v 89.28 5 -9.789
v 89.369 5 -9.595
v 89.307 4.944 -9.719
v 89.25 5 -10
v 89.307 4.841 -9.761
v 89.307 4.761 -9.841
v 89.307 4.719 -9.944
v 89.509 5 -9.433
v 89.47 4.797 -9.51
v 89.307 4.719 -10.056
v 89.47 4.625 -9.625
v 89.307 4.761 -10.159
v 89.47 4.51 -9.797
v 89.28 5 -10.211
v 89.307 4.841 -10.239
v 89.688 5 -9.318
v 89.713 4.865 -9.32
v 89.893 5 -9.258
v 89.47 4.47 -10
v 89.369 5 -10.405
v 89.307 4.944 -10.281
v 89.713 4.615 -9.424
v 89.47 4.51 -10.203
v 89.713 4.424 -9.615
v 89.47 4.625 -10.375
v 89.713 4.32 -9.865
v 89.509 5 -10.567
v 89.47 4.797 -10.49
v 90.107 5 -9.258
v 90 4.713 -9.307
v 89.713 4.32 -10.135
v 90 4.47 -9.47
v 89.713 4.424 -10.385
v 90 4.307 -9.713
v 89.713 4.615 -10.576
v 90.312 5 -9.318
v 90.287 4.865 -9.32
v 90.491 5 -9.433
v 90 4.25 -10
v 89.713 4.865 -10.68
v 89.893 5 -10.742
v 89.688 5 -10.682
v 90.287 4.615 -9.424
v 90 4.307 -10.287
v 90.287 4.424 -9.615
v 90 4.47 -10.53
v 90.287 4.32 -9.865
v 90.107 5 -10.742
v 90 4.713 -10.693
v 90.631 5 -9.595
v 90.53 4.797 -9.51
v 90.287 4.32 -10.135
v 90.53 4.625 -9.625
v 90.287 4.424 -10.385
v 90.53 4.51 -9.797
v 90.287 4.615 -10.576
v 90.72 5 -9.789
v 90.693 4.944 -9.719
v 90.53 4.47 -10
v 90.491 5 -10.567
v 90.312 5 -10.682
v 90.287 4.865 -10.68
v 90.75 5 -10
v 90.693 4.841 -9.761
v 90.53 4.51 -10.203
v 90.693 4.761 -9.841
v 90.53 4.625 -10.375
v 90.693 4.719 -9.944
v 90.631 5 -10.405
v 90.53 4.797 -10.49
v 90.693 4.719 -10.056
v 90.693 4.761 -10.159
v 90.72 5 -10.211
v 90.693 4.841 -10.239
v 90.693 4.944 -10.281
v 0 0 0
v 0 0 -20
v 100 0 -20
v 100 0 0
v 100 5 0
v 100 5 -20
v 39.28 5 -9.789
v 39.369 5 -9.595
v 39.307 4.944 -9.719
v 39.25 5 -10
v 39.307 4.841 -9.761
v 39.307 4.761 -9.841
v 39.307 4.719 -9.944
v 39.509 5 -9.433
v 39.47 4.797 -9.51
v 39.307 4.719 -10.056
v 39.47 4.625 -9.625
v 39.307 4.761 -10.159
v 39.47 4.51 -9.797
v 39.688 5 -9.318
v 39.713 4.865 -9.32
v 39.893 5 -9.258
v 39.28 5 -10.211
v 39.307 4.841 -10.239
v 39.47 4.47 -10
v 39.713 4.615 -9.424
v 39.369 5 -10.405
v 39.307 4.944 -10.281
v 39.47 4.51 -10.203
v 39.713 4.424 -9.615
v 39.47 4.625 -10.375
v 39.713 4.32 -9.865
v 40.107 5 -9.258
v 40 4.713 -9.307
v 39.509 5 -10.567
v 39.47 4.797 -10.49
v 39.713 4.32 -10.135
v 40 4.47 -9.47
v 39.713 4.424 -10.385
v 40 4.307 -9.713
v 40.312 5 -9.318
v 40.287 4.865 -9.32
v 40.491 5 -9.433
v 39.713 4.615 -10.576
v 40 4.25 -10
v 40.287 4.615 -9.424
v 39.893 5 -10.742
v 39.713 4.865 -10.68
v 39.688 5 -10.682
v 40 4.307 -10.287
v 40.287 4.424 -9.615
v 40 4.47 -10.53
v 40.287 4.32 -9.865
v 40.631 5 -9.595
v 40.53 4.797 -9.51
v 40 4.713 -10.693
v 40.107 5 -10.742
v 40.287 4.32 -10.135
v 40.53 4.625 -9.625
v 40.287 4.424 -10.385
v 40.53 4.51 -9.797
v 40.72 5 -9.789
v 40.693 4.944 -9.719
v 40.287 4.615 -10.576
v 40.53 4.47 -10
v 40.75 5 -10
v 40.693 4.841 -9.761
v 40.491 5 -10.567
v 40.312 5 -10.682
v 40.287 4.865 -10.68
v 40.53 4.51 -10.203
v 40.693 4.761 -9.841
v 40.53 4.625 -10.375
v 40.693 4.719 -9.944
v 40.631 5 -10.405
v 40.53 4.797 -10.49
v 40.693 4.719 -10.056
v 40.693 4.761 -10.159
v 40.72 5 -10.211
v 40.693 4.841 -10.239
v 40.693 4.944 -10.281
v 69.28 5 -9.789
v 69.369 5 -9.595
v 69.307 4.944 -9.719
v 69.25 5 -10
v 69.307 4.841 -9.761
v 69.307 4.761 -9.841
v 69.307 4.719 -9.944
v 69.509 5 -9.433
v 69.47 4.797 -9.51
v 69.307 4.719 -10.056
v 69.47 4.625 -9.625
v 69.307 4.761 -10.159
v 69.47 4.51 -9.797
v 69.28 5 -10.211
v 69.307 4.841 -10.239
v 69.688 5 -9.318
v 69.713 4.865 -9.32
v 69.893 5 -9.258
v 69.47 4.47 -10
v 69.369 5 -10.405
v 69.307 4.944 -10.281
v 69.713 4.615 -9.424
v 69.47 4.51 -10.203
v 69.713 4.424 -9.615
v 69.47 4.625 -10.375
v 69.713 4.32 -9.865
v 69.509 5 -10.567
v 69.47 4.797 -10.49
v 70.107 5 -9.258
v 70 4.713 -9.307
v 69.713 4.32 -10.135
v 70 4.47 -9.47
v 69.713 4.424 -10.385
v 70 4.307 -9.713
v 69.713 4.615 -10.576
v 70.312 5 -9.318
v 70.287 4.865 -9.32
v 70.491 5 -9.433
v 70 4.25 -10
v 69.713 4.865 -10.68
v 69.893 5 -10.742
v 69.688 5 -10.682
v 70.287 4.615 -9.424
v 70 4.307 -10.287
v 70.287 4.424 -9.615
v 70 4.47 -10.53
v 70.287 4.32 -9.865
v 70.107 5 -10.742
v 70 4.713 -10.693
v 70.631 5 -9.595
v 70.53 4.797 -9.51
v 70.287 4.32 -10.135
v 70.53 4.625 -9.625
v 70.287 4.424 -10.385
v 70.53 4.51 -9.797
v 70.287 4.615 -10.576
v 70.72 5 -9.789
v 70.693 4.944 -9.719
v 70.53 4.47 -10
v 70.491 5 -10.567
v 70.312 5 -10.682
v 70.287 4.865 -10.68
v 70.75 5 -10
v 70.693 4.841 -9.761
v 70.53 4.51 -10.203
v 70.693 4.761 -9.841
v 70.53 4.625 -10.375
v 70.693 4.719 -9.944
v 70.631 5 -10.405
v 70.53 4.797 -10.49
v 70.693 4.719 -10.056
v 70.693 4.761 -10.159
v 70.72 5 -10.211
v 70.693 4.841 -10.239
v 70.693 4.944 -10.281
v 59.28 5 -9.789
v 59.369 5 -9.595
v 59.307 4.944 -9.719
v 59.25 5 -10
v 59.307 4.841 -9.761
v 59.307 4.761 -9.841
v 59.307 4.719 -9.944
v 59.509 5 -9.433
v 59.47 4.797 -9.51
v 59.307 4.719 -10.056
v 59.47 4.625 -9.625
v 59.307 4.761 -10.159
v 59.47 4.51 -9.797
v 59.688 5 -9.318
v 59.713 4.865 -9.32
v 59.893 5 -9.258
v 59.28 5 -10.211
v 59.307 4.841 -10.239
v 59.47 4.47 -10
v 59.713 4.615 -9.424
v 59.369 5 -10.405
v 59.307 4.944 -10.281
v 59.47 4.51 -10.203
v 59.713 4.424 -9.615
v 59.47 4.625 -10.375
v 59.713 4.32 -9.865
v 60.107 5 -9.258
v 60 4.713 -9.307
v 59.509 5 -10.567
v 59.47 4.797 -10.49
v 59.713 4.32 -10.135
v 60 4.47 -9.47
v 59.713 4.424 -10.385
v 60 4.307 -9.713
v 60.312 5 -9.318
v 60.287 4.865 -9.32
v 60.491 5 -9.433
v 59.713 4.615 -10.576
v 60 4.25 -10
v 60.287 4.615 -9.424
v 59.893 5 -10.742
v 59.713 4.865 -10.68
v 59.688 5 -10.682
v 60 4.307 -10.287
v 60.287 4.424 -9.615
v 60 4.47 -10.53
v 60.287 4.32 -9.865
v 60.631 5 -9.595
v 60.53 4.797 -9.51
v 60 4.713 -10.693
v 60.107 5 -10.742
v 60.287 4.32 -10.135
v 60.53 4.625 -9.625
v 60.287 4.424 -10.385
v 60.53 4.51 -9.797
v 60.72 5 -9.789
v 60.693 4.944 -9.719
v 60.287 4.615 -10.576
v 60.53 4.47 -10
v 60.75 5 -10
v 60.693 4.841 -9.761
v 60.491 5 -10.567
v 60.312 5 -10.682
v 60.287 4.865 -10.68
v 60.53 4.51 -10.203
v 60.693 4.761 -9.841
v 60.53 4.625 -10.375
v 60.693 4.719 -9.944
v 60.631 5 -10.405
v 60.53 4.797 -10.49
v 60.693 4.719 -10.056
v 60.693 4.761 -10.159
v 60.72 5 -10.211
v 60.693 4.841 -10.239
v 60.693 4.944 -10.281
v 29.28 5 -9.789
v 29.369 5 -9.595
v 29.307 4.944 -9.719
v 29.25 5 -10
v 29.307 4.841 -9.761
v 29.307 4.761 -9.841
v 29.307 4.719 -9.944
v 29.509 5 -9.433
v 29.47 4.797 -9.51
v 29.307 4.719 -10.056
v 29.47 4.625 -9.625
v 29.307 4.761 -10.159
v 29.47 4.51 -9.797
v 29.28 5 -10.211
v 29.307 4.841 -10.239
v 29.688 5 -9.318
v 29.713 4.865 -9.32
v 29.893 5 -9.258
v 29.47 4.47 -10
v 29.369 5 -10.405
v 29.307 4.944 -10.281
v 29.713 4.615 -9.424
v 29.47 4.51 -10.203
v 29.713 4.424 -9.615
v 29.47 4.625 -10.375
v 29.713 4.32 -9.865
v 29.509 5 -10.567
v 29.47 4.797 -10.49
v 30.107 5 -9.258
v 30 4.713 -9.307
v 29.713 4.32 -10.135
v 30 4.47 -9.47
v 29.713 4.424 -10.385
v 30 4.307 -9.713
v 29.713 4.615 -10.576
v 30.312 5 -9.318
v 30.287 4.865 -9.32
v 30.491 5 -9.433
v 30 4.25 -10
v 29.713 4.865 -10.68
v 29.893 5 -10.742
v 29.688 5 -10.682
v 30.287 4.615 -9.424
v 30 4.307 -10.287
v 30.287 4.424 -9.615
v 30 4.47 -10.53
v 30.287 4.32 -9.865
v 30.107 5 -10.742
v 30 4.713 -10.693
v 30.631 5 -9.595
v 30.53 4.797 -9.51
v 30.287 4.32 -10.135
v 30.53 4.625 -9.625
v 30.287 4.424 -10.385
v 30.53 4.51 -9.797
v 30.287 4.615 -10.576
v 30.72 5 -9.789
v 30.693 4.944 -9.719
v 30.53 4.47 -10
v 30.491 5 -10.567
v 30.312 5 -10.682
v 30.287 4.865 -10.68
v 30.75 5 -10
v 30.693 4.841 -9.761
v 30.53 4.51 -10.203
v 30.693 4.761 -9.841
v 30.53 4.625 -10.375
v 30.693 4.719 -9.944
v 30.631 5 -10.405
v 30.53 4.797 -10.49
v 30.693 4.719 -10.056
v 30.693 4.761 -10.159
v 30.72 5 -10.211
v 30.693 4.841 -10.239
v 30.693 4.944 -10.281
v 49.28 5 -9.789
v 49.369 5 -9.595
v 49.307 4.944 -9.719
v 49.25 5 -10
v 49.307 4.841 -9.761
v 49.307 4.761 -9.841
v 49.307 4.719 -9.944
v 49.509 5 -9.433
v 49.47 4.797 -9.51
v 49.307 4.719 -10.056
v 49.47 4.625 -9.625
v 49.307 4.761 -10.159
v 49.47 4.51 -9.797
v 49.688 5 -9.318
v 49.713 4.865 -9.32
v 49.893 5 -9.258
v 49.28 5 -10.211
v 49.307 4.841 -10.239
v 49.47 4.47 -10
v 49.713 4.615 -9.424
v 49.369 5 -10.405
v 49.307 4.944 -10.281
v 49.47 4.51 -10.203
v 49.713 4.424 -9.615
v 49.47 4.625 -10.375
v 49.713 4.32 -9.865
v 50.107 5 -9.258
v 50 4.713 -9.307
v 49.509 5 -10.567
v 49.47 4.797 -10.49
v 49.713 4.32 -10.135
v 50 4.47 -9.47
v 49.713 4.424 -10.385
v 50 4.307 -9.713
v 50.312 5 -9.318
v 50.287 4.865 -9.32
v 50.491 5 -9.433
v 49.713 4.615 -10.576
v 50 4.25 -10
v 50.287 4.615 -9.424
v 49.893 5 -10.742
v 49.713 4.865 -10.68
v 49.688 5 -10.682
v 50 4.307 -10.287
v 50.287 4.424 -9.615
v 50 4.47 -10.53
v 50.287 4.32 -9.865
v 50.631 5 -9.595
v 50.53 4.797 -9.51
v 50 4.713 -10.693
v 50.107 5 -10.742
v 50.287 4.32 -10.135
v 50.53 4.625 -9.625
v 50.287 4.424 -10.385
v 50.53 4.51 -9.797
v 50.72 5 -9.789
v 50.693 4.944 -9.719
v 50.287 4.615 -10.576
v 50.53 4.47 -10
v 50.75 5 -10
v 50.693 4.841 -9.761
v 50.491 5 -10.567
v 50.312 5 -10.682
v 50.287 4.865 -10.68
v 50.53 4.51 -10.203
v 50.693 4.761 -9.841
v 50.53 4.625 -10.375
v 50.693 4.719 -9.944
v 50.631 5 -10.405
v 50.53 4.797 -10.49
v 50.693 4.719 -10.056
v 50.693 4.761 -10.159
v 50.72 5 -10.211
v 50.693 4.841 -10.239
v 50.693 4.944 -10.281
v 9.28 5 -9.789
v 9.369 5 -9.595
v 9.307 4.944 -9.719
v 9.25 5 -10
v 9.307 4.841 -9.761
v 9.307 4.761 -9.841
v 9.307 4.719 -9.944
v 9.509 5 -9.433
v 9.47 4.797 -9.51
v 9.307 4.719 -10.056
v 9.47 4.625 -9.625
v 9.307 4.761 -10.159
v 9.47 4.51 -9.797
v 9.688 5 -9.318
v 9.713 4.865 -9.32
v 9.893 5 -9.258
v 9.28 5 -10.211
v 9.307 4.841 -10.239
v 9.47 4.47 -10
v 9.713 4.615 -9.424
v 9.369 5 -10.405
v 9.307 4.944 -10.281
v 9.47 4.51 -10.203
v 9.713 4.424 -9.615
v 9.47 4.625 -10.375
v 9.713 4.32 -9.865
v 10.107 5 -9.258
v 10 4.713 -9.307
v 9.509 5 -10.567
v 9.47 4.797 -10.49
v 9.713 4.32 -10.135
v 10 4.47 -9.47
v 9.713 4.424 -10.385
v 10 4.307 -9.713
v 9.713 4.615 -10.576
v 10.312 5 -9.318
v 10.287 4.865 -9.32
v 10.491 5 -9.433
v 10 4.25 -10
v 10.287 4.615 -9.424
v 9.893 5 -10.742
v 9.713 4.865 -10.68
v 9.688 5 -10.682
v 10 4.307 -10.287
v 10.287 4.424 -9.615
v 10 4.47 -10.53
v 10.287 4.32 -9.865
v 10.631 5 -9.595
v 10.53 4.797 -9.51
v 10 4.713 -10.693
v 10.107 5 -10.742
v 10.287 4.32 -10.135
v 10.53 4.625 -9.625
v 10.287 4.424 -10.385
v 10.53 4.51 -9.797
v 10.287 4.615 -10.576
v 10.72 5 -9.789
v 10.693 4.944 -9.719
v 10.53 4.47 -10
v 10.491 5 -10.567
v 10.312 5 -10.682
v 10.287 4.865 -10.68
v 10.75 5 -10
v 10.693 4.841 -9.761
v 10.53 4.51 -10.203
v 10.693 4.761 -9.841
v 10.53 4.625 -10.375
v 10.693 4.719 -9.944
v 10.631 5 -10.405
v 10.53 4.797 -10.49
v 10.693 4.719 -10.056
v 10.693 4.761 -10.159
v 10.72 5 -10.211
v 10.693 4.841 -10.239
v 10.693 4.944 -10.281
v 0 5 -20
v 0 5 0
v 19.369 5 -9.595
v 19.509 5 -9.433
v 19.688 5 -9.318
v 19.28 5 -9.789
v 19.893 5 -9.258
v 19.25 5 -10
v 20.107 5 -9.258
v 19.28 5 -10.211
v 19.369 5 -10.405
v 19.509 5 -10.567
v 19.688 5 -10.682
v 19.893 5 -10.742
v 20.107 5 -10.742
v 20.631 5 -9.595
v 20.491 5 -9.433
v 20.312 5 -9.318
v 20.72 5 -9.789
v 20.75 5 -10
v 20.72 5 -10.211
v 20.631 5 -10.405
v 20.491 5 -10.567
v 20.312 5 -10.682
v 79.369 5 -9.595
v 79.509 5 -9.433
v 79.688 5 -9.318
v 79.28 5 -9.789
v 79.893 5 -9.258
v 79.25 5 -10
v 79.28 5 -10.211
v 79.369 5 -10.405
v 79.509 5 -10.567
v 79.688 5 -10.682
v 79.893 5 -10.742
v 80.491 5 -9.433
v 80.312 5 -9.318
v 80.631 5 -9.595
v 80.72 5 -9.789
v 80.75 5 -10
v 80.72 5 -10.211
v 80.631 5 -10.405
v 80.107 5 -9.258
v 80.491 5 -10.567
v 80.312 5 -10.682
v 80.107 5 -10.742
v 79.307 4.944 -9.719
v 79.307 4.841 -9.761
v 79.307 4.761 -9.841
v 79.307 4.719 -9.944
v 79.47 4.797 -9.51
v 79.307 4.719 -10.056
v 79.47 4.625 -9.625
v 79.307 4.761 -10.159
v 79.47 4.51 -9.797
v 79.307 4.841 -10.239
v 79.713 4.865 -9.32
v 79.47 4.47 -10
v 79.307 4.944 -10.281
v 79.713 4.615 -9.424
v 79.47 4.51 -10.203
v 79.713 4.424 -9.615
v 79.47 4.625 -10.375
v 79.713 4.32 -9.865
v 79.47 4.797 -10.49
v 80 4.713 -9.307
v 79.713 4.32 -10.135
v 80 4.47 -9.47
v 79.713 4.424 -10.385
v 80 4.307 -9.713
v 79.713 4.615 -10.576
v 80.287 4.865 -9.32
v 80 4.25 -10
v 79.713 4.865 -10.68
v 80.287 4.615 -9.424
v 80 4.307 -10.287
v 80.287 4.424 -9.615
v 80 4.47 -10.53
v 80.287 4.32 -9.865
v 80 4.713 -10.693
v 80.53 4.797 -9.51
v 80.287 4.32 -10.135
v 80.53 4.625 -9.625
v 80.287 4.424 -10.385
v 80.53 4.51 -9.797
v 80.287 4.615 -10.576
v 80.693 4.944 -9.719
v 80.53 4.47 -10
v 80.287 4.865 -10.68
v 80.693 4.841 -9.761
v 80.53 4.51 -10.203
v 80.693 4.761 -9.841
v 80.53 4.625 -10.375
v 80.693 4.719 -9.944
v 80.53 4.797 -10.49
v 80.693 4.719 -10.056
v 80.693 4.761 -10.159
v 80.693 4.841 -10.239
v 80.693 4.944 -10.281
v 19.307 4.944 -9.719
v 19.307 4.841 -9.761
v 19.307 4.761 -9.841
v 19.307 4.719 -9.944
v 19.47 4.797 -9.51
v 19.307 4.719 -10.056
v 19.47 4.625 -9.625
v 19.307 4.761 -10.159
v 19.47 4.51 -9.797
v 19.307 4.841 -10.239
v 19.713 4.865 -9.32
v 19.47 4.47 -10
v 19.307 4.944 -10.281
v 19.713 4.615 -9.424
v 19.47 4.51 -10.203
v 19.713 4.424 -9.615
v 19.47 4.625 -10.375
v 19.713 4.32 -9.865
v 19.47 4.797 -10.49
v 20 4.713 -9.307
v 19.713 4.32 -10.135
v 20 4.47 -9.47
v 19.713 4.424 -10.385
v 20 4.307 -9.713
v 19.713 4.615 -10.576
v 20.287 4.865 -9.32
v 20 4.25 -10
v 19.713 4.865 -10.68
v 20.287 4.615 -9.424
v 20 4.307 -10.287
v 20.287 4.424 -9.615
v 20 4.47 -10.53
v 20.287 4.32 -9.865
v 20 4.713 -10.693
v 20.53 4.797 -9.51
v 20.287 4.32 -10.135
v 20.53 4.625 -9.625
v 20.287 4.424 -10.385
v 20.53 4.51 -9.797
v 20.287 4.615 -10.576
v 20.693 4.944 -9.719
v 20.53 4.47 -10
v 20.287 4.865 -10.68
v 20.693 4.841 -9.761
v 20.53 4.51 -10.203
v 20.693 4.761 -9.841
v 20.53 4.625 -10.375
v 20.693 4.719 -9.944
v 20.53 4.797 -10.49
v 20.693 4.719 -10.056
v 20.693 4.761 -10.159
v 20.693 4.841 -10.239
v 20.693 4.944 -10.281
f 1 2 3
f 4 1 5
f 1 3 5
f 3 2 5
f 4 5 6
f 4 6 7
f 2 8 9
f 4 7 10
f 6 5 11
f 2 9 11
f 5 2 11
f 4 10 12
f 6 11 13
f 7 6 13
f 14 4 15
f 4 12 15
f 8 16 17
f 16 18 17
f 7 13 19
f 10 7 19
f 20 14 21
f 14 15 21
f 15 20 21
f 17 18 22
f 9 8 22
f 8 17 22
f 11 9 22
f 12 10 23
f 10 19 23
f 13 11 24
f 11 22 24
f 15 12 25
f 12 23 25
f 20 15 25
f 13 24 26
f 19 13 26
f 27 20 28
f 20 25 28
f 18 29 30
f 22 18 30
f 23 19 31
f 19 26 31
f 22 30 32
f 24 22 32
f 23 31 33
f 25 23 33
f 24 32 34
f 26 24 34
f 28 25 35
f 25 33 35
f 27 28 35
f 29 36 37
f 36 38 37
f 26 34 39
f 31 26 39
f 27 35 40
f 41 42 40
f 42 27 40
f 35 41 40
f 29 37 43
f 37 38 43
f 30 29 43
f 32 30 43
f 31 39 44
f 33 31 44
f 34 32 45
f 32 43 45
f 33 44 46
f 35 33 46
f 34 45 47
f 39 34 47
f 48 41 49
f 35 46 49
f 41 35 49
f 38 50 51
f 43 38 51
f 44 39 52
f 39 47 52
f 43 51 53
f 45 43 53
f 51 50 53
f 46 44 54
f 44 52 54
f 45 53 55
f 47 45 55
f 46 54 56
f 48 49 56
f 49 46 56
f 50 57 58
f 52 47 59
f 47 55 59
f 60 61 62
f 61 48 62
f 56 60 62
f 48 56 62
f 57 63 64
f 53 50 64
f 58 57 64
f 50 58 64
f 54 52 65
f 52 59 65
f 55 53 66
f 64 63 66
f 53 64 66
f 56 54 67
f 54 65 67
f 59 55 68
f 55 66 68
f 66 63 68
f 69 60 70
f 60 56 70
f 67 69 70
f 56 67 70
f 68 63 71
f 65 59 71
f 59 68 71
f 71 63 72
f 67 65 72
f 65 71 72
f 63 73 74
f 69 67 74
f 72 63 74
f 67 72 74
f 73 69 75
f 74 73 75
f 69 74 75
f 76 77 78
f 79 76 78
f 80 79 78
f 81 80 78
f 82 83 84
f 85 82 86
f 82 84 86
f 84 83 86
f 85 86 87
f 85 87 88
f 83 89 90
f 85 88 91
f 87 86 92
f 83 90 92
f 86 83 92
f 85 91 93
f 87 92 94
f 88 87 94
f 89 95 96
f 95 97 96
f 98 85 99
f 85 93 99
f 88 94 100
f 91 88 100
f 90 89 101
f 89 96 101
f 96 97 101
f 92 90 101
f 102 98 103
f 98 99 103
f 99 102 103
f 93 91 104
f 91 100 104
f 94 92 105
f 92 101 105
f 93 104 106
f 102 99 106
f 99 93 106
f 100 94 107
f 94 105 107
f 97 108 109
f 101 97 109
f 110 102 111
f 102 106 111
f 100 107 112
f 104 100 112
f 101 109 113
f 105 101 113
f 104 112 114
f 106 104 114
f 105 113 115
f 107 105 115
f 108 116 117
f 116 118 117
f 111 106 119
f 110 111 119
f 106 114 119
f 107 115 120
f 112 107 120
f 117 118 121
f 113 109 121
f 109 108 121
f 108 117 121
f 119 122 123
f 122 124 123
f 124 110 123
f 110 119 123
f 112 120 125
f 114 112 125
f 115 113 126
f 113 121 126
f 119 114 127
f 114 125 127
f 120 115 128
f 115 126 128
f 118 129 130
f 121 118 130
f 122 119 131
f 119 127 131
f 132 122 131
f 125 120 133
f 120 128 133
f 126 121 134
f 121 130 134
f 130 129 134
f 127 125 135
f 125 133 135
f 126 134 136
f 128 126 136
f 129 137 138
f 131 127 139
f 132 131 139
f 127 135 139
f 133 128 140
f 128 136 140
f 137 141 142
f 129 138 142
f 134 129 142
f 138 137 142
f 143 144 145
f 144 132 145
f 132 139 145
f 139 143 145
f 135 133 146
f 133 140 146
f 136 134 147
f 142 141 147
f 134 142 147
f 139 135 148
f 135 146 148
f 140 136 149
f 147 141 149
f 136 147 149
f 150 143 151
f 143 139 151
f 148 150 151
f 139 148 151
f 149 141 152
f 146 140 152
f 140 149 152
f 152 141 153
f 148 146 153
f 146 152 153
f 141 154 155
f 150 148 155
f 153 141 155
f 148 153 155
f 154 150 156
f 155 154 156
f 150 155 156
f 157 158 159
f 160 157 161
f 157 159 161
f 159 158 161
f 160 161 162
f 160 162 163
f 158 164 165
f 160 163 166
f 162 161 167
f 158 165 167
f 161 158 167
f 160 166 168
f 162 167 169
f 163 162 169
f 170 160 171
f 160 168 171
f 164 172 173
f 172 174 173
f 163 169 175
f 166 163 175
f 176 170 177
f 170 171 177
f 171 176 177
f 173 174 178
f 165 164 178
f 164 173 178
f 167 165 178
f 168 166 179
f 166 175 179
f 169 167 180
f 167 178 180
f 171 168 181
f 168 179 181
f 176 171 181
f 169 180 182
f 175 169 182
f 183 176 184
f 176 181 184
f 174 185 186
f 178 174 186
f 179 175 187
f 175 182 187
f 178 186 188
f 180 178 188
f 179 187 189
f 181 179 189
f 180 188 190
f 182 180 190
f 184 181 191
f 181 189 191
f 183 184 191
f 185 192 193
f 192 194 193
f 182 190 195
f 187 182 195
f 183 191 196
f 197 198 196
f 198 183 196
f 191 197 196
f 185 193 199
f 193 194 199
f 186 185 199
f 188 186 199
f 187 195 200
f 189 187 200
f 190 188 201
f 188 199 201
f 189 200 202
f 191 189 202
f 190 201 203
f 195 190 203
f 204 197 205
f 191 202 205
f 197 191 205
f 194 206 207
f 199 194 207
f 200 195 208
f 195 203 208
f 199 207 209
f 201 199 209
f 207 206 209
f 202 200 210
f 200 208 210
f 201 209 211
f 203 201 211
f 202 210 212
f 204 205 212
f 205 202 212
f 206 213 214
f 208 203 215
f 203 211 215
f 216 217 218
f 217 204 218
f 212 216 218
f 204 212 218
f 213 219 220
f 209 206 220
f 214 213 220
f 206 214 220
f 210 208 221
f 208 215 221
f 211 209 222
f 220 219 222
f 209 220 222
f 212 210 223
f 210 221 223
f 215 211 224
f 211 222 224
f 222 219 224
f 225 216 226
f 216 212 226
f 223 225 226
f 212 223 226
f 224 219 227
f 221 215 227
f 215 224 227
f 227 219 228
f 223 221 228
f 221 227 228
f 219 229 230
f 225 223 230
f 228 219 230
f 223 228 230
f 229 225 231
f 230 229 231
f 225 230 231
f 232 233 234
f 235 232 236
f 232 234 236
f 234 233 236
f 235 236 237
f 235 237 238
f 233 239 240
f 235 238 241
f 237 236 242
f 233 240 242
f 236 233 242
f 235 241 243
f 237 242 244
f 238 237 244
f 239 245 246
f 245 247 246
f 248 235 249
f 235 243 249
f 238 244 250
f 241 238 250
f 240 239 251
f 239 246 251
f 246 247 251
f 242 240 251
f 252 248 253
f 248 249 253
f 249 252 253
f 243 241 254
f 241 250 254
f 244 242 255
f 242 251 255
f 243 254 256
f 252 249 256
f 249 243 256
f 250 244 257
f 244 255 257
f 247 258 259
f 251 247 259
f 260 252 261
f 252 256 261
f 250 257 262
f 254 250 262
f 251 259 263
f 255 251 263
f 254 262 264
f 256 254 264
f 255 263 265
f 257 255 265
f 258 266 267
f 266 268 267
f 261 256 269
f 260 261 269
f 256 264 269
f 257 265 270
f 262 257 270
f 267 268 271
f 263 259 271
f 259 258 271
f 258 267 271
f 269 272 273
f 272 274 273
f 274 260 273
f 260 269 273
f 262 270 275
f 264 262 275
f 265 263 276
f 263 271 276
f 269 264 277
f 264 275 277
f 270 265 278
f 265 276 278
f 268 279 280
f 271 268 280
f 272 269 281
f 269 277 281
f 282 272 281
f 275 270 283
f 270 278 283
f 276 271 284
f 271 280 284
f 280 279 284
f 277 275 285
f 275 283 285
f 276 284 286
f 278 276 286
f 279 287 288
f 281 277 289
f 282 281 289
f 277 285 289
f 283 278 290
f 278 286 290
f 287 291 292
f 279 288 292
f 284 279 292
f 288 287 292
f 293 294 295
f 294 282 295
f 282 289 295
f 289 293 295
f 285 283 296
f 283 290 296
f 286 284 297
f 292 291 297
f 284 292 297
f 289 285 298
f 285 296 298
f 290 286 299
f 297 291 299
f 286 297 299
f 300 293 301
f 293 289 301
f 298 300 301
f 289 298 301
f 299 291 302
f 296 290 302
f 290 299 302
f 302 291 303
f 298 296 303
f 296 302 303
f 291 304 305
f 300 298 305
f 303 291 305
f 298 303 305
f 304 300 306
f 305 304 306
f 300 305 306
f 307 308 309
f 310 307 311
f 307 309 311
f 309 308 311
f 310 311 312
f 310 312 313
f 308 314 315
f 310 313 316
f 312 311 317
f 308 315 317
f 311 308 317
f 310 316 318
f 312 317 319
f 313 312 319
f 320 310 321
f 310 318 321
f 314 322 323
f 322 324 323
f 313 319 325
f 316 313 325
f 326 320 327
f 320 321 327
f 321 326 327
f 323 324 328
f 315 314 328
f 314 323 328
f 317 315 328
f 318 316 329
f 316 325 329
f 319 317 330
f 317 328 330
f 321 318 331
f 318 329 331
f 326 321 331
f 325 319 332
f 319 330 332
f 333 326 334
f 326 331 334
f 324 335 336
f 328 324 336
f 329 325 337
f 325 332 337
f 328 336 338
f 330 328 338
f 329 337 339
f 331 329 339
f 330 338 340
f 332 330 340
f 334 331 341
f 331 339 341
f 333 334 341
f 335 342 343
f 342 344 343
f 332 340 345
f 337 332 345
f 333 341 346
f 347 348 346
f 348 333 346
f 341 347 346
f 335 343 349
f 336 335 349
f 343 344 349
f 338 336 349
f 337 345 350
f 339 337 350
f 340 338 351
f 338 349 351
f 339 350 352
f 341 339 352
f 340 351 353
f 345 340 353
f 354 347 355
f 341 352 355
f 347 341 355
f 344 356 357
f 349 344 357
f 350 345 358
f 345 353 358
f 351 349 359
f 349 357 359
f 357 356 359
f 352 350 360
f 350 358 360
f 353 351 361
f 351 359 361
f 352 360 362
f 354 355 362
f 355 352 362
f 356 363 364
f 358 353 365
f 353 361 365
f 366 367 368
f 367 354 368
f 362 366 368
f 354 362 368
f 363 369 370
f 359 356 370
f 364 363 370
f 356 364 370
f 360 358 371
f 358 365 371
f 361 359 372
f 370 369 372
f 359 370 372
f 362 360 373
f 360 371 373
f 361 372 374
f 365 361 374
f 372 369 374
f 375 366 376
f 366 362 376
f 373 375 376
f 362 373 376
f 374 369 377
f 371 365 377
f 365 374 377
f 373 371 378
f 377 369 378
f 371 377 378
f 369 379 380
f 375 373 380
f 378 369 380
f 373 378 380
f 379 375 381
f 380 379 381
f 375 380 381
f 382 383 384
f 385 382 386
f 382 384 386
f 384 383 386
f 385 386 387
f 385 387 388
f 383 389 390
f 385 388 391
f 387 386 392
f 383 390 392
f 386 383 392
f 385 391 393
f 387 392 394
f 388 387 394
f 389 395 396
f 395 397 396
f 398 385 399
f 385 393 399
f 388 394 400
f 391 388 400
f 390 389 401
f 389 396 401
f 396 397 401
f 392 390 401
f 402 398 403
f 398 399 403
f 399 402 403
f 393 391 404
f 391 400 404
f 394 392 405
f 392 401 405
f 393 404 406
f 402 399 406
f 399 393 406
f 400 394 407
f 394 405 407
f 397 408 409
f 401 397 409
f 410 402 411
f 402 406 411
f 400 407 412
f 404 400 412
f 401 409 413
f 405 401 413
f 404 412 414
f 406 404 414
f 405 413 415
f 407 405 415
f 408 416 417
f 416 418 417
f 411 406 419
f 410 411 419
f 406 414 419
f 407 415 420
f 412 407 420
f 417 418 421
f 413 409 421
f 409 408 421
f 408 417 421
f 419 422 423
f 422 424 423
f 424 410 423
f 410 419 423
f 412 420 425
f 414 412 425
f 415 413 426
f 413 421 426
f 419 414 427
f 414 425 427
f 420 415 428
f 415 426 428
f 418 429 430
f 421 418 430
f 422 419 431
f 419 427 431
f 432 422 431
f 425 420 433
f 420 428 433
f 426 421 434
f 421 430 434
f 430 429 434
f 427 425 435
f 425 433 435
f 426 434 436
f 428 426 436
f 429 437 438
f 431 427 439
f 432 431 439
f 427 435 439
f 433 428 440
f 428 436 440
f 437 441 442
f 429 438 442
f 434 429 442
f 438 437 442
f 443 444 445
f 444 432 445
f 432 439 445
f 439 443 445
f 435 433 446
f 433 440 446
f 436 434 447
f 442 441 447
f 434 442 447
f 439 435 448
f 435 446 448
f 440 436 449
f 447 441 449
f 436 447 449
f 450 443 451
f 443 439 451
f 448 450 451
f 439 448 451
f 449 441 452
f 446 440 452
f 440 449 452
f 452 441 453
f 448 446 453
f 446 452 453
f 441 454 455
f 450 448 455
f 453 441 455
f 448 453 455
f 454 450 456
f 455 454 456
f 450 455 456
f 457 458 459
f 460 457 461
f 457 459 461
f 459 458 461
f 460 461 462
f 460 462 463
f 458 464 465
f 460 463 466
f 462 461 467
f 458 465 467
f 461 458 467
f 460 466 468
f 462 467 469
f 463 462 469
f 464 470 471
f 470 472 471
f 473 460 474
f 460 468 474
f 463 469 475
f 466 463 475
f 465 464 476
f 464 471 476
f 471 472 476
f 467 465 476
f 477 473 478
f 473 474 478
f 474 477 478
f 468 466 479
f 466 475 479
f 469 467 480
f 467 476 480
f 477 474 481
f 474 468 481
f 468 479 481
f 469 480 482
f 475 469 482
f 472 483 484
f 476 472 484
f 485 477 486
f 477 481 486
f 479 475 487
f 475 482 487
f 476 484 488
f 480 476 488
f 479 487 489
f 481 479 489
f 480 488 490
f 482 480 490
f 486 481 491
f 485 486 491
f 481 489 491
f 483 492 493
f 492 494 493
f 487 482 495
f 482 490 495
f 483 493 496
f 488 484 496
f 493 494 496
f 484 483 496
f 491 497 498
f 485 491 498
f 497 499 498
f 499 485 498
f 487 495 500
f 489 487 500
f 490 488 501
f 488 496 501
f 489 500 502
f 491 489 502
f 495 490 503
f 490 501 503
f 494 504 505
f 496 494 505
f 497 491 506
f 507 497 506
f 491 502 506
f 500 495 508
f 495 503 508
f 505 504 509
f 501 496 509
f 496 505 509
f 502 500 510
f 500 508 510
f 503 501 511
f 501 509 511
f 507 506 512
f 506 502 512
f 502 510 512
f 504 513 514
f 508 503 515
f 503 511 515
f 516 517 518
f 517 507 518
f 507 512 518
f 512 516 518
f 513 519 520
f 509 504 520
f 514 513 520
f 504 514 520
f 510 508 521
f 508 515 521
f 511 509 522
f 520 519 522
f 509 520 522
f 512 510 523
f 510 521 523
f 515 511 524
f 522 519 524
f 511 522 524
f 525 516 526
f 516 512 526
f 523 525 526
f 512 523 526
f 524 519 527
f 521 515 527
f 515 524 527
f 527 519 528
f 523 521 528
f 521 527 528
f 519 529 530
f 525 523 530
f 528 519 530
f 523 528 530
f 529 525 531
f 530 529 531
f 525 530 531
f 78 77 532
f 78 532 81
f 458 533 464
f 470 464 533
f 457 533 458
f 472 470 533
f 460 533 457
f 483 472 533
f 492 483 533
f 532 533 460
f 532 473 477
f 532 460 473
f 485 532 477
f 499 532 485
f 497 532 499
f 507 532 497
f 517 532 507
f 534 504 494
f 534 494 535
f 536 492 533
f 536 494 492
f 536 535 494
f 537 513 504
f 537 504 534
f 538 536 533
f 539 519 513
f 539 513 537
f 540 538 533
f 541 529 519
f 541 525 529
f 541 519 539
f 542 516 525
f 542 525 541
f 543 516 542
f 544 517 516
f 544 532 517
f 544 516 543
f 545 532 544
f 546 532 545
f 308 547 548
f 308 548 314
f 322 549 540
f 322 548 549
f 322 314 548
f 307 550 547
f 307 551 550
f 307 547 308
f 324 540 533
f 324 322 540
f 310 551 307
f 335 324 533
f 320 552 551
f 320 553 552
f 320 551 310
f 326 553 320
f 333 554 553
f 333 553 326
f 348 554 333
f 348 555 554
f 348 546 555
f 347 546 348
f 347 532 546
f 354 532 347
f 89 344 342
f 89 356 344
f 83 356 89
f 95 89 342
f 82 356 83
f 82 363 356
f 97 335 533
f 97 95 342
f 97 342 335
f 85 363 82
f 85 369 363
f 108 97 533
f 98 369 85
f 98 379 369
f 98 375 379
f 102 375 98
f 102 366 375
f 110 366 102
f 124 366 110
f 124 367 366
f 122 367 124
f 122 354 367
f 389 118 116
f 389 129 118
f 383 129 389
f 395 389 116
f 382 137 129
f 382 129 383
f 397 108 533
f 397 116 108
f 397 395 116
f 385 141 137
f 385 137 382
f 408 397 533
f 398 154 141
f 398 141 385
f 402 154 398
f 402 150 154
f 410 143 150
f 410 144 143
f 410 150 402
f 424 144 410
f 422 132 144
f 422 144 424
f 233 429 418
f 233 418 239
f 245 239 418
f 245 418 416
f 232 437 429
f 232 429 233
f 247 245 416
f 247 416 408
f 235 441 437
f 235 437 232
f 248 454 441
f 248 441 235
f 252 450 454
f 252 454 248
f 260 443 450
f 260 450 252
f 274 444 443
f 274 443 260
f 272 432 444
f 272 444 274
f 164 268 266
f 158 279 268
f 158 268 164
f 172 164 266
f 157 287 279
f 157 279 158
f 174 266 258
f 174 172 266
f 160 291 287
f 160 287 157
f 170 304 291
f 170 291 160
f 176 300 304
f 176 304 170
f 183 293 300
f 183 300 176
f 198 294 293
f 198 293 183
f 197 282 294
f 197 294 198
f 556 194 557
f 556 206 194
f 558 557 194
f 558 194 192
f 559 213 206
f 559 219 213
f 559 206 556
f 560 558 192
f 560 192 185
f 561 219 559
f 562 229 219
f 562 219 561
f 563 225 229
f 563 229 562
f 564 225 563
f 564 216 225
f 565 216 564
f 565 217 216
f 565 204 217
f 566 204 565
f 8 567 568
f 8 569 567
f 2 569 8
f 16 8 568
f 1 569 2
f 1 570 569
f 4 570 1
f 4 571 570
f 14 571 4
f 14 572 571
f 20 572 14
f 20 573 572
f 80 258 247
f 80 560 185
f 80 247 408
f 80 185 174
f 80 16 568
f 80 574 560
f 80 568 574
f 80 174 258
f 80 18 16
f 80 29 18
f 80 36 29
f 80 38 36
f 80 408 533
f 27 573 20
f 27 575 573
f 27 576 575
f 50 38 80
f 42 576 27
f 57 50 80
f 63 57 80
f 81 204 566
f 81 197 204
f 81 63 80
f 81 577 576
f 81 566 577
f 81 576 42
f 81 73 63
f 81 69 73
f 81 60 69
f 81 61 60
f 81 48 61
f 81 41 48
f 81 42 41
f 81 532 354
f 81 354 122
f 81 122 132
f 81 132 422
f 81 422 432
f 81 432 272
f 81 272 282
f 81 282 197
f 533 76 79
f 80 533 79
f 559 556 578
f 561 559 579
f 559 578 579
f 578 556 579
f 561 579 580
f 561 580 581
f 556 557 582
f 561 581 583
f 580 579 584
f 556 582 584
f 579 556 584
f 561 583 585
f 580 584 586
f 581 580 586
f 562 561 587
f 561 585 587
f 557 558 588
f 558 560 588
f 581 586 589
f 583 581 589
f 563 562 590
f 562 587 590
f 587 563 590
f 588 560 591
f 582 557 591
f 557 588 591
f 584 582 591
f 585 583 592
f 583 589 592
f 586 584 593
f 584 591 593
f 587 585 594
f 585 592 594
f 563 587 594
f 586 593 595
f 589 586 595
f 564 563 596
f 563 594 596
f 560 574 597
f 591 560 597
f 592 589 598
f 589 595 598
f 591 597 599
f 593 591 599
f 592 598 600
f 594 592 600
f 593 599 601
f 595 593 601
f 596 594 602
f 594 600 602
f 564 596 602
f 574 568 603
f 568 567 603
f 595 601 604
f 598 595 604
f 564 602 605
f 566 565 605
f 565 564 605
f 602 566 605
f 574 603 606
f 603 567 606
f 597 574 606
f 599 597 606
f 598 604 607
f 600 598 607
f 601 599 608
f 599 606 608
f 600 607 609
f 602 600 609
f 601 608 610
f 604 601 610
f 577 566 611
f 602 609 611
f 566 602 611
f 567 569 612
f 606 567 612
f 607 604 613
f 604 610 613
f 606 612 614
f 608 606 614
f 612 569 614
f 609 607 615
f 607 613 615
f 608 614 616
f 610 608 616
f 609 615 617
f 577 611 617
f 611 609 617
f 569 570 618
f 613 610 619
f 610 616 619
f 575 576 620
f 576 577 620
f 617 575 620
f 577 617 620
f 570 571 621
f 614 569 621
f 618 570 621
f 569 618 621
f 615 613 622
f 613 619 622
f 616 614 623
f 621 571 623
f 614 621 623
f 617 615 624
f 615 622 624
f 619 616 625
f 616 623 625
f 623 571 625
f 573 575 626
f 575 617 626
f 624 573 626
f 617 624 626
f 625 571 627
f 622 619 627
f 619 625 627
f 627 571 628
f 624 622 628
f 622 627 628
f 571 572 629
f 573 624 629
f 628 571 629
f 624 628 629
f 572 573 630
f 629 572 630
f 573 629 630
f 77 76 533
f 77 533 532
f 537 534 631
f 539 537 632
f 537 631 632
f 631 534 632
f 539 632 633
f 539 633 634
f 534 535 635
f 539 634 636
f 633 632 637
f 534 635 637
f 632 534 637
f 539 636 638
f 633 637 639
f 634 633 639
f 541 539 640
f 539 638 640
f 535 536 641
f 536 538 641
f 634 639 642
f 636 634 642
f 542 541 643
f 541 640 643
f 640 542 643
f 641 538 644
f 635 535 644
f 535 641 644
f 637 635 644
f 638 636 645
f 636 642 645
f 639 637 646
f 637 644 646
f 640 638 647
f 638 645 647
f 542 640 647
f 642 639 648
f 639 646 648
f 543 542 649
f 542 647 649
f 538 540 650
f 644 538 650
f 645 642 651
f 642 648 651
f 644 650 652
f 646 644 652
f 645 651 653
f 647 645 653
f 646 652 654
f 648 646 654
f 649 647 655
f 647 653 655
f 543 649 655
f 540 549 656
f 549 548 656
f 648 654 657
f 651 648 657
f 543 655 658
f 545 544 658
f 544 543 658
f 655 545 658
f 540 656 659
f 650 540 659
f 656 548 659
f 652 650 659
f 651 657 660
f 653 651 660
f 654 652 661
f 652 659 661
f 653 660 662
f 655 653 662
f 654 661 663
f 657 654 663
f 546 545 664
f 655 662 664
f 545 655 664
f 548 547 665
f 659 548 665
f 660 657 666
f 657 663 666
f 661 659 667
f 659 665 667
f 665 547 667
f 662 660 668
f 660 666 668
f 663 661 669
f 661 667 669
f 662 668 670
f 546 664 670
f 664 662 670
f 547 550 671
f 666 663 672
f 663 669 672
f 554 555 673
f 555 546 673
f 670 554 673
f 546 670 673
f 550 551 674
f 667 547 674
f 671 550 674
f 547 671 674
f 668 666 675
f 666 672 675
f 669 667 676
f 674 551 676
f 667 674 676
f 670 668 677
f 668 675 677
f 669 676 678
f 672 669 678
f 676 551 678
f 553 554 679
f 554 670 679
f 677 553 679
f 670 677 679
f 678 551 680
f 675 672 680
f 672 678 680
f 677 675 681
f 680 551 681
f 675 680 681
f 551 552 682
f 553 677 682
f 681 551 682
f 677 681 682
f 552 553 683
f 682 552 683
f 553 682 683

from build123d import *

# Parameters (mm, degrees)
SKETCH_1_W      = 100
SKETCH_1_H      = 20
EXTRUDE_1_DEPTH = 5


with BuildPart() as part:
    # 草图1 → 凸台-拉伸1 (new body)
    with BuildSketch(Plane(origin=(0, 0, 0), x_dir=(1, 0, 0), z_dir=(0, 1, 0))):
        with Locations((50, 10)):
            Rectangle(SKETCH_1_W, SKETCH_1_H)
    extrude(amount=EXTRUDE_1_DEPTH)

    # 草图2 → 切除-旋转3 (revolve, cut)
    with BuildSketch(Plane(origin=(0, 5, 0), x_dir=(1, 0, 0), z_dir=(0, 1, 0))):
        with BuildLine():
            Line((10.75, 10), (9.25, 10))
            ThreePointArc((9.25, 10), (10, 9.25), (10.75, 10))
        make_face()
        with BuildLine():
            Line((20.75, 10), (19.25, 10))
            ThreePointArc((19.25, 10), (20, 9.25), (20.75, 10))
        make_face()
        with BuildLine():
            Line((30.75, 10), (29.25, 10))
            ThreePointArc((29.25, 10), (30, 9.25), (30.75, 10))
        make_face()
        with BuildLine():
            Line((40.75, 10), (39.25, 10))
            ThreePointArc((39.25, 10), (40, 9.25), (40.75, 10))
        make_face()
        with BuildLine():
            Line((50.75, 10), (49.25, 10))
            ThreePointArc((49.25, 10), (50, 9.25), (50.75, 10))
        make_face()
        with BuildLine():
            Line((60.75, 10), (59.25, 10))
            ThreePointArc((59.25, 10), (60, 9.25), (60.75, 10))
        make_face()
        with BuildLine():
            Line((70.75, 10), (69.25, 10))
            ThreePointArc((69.25, 10), (70, 9.25), (70.75, 10))
        make_face()
        with BuildLine():
            Line((80.75, 10), (79.25, 10))
            ThreePointArc((79.25, 10), (80, 9.25), (80.75, 10))
        make_face()
        with BuildLine():
            Line((90.75, 10), (89.25, 10))
            ThreePointArc((89.25, 10), (90, 9.25), (90.75, 10))
        make_face()
    revolve(axis=Axis((0, 5, -10), (1, 0, 0)), mode=Mode.SUBTRACT)


solid = part.part
